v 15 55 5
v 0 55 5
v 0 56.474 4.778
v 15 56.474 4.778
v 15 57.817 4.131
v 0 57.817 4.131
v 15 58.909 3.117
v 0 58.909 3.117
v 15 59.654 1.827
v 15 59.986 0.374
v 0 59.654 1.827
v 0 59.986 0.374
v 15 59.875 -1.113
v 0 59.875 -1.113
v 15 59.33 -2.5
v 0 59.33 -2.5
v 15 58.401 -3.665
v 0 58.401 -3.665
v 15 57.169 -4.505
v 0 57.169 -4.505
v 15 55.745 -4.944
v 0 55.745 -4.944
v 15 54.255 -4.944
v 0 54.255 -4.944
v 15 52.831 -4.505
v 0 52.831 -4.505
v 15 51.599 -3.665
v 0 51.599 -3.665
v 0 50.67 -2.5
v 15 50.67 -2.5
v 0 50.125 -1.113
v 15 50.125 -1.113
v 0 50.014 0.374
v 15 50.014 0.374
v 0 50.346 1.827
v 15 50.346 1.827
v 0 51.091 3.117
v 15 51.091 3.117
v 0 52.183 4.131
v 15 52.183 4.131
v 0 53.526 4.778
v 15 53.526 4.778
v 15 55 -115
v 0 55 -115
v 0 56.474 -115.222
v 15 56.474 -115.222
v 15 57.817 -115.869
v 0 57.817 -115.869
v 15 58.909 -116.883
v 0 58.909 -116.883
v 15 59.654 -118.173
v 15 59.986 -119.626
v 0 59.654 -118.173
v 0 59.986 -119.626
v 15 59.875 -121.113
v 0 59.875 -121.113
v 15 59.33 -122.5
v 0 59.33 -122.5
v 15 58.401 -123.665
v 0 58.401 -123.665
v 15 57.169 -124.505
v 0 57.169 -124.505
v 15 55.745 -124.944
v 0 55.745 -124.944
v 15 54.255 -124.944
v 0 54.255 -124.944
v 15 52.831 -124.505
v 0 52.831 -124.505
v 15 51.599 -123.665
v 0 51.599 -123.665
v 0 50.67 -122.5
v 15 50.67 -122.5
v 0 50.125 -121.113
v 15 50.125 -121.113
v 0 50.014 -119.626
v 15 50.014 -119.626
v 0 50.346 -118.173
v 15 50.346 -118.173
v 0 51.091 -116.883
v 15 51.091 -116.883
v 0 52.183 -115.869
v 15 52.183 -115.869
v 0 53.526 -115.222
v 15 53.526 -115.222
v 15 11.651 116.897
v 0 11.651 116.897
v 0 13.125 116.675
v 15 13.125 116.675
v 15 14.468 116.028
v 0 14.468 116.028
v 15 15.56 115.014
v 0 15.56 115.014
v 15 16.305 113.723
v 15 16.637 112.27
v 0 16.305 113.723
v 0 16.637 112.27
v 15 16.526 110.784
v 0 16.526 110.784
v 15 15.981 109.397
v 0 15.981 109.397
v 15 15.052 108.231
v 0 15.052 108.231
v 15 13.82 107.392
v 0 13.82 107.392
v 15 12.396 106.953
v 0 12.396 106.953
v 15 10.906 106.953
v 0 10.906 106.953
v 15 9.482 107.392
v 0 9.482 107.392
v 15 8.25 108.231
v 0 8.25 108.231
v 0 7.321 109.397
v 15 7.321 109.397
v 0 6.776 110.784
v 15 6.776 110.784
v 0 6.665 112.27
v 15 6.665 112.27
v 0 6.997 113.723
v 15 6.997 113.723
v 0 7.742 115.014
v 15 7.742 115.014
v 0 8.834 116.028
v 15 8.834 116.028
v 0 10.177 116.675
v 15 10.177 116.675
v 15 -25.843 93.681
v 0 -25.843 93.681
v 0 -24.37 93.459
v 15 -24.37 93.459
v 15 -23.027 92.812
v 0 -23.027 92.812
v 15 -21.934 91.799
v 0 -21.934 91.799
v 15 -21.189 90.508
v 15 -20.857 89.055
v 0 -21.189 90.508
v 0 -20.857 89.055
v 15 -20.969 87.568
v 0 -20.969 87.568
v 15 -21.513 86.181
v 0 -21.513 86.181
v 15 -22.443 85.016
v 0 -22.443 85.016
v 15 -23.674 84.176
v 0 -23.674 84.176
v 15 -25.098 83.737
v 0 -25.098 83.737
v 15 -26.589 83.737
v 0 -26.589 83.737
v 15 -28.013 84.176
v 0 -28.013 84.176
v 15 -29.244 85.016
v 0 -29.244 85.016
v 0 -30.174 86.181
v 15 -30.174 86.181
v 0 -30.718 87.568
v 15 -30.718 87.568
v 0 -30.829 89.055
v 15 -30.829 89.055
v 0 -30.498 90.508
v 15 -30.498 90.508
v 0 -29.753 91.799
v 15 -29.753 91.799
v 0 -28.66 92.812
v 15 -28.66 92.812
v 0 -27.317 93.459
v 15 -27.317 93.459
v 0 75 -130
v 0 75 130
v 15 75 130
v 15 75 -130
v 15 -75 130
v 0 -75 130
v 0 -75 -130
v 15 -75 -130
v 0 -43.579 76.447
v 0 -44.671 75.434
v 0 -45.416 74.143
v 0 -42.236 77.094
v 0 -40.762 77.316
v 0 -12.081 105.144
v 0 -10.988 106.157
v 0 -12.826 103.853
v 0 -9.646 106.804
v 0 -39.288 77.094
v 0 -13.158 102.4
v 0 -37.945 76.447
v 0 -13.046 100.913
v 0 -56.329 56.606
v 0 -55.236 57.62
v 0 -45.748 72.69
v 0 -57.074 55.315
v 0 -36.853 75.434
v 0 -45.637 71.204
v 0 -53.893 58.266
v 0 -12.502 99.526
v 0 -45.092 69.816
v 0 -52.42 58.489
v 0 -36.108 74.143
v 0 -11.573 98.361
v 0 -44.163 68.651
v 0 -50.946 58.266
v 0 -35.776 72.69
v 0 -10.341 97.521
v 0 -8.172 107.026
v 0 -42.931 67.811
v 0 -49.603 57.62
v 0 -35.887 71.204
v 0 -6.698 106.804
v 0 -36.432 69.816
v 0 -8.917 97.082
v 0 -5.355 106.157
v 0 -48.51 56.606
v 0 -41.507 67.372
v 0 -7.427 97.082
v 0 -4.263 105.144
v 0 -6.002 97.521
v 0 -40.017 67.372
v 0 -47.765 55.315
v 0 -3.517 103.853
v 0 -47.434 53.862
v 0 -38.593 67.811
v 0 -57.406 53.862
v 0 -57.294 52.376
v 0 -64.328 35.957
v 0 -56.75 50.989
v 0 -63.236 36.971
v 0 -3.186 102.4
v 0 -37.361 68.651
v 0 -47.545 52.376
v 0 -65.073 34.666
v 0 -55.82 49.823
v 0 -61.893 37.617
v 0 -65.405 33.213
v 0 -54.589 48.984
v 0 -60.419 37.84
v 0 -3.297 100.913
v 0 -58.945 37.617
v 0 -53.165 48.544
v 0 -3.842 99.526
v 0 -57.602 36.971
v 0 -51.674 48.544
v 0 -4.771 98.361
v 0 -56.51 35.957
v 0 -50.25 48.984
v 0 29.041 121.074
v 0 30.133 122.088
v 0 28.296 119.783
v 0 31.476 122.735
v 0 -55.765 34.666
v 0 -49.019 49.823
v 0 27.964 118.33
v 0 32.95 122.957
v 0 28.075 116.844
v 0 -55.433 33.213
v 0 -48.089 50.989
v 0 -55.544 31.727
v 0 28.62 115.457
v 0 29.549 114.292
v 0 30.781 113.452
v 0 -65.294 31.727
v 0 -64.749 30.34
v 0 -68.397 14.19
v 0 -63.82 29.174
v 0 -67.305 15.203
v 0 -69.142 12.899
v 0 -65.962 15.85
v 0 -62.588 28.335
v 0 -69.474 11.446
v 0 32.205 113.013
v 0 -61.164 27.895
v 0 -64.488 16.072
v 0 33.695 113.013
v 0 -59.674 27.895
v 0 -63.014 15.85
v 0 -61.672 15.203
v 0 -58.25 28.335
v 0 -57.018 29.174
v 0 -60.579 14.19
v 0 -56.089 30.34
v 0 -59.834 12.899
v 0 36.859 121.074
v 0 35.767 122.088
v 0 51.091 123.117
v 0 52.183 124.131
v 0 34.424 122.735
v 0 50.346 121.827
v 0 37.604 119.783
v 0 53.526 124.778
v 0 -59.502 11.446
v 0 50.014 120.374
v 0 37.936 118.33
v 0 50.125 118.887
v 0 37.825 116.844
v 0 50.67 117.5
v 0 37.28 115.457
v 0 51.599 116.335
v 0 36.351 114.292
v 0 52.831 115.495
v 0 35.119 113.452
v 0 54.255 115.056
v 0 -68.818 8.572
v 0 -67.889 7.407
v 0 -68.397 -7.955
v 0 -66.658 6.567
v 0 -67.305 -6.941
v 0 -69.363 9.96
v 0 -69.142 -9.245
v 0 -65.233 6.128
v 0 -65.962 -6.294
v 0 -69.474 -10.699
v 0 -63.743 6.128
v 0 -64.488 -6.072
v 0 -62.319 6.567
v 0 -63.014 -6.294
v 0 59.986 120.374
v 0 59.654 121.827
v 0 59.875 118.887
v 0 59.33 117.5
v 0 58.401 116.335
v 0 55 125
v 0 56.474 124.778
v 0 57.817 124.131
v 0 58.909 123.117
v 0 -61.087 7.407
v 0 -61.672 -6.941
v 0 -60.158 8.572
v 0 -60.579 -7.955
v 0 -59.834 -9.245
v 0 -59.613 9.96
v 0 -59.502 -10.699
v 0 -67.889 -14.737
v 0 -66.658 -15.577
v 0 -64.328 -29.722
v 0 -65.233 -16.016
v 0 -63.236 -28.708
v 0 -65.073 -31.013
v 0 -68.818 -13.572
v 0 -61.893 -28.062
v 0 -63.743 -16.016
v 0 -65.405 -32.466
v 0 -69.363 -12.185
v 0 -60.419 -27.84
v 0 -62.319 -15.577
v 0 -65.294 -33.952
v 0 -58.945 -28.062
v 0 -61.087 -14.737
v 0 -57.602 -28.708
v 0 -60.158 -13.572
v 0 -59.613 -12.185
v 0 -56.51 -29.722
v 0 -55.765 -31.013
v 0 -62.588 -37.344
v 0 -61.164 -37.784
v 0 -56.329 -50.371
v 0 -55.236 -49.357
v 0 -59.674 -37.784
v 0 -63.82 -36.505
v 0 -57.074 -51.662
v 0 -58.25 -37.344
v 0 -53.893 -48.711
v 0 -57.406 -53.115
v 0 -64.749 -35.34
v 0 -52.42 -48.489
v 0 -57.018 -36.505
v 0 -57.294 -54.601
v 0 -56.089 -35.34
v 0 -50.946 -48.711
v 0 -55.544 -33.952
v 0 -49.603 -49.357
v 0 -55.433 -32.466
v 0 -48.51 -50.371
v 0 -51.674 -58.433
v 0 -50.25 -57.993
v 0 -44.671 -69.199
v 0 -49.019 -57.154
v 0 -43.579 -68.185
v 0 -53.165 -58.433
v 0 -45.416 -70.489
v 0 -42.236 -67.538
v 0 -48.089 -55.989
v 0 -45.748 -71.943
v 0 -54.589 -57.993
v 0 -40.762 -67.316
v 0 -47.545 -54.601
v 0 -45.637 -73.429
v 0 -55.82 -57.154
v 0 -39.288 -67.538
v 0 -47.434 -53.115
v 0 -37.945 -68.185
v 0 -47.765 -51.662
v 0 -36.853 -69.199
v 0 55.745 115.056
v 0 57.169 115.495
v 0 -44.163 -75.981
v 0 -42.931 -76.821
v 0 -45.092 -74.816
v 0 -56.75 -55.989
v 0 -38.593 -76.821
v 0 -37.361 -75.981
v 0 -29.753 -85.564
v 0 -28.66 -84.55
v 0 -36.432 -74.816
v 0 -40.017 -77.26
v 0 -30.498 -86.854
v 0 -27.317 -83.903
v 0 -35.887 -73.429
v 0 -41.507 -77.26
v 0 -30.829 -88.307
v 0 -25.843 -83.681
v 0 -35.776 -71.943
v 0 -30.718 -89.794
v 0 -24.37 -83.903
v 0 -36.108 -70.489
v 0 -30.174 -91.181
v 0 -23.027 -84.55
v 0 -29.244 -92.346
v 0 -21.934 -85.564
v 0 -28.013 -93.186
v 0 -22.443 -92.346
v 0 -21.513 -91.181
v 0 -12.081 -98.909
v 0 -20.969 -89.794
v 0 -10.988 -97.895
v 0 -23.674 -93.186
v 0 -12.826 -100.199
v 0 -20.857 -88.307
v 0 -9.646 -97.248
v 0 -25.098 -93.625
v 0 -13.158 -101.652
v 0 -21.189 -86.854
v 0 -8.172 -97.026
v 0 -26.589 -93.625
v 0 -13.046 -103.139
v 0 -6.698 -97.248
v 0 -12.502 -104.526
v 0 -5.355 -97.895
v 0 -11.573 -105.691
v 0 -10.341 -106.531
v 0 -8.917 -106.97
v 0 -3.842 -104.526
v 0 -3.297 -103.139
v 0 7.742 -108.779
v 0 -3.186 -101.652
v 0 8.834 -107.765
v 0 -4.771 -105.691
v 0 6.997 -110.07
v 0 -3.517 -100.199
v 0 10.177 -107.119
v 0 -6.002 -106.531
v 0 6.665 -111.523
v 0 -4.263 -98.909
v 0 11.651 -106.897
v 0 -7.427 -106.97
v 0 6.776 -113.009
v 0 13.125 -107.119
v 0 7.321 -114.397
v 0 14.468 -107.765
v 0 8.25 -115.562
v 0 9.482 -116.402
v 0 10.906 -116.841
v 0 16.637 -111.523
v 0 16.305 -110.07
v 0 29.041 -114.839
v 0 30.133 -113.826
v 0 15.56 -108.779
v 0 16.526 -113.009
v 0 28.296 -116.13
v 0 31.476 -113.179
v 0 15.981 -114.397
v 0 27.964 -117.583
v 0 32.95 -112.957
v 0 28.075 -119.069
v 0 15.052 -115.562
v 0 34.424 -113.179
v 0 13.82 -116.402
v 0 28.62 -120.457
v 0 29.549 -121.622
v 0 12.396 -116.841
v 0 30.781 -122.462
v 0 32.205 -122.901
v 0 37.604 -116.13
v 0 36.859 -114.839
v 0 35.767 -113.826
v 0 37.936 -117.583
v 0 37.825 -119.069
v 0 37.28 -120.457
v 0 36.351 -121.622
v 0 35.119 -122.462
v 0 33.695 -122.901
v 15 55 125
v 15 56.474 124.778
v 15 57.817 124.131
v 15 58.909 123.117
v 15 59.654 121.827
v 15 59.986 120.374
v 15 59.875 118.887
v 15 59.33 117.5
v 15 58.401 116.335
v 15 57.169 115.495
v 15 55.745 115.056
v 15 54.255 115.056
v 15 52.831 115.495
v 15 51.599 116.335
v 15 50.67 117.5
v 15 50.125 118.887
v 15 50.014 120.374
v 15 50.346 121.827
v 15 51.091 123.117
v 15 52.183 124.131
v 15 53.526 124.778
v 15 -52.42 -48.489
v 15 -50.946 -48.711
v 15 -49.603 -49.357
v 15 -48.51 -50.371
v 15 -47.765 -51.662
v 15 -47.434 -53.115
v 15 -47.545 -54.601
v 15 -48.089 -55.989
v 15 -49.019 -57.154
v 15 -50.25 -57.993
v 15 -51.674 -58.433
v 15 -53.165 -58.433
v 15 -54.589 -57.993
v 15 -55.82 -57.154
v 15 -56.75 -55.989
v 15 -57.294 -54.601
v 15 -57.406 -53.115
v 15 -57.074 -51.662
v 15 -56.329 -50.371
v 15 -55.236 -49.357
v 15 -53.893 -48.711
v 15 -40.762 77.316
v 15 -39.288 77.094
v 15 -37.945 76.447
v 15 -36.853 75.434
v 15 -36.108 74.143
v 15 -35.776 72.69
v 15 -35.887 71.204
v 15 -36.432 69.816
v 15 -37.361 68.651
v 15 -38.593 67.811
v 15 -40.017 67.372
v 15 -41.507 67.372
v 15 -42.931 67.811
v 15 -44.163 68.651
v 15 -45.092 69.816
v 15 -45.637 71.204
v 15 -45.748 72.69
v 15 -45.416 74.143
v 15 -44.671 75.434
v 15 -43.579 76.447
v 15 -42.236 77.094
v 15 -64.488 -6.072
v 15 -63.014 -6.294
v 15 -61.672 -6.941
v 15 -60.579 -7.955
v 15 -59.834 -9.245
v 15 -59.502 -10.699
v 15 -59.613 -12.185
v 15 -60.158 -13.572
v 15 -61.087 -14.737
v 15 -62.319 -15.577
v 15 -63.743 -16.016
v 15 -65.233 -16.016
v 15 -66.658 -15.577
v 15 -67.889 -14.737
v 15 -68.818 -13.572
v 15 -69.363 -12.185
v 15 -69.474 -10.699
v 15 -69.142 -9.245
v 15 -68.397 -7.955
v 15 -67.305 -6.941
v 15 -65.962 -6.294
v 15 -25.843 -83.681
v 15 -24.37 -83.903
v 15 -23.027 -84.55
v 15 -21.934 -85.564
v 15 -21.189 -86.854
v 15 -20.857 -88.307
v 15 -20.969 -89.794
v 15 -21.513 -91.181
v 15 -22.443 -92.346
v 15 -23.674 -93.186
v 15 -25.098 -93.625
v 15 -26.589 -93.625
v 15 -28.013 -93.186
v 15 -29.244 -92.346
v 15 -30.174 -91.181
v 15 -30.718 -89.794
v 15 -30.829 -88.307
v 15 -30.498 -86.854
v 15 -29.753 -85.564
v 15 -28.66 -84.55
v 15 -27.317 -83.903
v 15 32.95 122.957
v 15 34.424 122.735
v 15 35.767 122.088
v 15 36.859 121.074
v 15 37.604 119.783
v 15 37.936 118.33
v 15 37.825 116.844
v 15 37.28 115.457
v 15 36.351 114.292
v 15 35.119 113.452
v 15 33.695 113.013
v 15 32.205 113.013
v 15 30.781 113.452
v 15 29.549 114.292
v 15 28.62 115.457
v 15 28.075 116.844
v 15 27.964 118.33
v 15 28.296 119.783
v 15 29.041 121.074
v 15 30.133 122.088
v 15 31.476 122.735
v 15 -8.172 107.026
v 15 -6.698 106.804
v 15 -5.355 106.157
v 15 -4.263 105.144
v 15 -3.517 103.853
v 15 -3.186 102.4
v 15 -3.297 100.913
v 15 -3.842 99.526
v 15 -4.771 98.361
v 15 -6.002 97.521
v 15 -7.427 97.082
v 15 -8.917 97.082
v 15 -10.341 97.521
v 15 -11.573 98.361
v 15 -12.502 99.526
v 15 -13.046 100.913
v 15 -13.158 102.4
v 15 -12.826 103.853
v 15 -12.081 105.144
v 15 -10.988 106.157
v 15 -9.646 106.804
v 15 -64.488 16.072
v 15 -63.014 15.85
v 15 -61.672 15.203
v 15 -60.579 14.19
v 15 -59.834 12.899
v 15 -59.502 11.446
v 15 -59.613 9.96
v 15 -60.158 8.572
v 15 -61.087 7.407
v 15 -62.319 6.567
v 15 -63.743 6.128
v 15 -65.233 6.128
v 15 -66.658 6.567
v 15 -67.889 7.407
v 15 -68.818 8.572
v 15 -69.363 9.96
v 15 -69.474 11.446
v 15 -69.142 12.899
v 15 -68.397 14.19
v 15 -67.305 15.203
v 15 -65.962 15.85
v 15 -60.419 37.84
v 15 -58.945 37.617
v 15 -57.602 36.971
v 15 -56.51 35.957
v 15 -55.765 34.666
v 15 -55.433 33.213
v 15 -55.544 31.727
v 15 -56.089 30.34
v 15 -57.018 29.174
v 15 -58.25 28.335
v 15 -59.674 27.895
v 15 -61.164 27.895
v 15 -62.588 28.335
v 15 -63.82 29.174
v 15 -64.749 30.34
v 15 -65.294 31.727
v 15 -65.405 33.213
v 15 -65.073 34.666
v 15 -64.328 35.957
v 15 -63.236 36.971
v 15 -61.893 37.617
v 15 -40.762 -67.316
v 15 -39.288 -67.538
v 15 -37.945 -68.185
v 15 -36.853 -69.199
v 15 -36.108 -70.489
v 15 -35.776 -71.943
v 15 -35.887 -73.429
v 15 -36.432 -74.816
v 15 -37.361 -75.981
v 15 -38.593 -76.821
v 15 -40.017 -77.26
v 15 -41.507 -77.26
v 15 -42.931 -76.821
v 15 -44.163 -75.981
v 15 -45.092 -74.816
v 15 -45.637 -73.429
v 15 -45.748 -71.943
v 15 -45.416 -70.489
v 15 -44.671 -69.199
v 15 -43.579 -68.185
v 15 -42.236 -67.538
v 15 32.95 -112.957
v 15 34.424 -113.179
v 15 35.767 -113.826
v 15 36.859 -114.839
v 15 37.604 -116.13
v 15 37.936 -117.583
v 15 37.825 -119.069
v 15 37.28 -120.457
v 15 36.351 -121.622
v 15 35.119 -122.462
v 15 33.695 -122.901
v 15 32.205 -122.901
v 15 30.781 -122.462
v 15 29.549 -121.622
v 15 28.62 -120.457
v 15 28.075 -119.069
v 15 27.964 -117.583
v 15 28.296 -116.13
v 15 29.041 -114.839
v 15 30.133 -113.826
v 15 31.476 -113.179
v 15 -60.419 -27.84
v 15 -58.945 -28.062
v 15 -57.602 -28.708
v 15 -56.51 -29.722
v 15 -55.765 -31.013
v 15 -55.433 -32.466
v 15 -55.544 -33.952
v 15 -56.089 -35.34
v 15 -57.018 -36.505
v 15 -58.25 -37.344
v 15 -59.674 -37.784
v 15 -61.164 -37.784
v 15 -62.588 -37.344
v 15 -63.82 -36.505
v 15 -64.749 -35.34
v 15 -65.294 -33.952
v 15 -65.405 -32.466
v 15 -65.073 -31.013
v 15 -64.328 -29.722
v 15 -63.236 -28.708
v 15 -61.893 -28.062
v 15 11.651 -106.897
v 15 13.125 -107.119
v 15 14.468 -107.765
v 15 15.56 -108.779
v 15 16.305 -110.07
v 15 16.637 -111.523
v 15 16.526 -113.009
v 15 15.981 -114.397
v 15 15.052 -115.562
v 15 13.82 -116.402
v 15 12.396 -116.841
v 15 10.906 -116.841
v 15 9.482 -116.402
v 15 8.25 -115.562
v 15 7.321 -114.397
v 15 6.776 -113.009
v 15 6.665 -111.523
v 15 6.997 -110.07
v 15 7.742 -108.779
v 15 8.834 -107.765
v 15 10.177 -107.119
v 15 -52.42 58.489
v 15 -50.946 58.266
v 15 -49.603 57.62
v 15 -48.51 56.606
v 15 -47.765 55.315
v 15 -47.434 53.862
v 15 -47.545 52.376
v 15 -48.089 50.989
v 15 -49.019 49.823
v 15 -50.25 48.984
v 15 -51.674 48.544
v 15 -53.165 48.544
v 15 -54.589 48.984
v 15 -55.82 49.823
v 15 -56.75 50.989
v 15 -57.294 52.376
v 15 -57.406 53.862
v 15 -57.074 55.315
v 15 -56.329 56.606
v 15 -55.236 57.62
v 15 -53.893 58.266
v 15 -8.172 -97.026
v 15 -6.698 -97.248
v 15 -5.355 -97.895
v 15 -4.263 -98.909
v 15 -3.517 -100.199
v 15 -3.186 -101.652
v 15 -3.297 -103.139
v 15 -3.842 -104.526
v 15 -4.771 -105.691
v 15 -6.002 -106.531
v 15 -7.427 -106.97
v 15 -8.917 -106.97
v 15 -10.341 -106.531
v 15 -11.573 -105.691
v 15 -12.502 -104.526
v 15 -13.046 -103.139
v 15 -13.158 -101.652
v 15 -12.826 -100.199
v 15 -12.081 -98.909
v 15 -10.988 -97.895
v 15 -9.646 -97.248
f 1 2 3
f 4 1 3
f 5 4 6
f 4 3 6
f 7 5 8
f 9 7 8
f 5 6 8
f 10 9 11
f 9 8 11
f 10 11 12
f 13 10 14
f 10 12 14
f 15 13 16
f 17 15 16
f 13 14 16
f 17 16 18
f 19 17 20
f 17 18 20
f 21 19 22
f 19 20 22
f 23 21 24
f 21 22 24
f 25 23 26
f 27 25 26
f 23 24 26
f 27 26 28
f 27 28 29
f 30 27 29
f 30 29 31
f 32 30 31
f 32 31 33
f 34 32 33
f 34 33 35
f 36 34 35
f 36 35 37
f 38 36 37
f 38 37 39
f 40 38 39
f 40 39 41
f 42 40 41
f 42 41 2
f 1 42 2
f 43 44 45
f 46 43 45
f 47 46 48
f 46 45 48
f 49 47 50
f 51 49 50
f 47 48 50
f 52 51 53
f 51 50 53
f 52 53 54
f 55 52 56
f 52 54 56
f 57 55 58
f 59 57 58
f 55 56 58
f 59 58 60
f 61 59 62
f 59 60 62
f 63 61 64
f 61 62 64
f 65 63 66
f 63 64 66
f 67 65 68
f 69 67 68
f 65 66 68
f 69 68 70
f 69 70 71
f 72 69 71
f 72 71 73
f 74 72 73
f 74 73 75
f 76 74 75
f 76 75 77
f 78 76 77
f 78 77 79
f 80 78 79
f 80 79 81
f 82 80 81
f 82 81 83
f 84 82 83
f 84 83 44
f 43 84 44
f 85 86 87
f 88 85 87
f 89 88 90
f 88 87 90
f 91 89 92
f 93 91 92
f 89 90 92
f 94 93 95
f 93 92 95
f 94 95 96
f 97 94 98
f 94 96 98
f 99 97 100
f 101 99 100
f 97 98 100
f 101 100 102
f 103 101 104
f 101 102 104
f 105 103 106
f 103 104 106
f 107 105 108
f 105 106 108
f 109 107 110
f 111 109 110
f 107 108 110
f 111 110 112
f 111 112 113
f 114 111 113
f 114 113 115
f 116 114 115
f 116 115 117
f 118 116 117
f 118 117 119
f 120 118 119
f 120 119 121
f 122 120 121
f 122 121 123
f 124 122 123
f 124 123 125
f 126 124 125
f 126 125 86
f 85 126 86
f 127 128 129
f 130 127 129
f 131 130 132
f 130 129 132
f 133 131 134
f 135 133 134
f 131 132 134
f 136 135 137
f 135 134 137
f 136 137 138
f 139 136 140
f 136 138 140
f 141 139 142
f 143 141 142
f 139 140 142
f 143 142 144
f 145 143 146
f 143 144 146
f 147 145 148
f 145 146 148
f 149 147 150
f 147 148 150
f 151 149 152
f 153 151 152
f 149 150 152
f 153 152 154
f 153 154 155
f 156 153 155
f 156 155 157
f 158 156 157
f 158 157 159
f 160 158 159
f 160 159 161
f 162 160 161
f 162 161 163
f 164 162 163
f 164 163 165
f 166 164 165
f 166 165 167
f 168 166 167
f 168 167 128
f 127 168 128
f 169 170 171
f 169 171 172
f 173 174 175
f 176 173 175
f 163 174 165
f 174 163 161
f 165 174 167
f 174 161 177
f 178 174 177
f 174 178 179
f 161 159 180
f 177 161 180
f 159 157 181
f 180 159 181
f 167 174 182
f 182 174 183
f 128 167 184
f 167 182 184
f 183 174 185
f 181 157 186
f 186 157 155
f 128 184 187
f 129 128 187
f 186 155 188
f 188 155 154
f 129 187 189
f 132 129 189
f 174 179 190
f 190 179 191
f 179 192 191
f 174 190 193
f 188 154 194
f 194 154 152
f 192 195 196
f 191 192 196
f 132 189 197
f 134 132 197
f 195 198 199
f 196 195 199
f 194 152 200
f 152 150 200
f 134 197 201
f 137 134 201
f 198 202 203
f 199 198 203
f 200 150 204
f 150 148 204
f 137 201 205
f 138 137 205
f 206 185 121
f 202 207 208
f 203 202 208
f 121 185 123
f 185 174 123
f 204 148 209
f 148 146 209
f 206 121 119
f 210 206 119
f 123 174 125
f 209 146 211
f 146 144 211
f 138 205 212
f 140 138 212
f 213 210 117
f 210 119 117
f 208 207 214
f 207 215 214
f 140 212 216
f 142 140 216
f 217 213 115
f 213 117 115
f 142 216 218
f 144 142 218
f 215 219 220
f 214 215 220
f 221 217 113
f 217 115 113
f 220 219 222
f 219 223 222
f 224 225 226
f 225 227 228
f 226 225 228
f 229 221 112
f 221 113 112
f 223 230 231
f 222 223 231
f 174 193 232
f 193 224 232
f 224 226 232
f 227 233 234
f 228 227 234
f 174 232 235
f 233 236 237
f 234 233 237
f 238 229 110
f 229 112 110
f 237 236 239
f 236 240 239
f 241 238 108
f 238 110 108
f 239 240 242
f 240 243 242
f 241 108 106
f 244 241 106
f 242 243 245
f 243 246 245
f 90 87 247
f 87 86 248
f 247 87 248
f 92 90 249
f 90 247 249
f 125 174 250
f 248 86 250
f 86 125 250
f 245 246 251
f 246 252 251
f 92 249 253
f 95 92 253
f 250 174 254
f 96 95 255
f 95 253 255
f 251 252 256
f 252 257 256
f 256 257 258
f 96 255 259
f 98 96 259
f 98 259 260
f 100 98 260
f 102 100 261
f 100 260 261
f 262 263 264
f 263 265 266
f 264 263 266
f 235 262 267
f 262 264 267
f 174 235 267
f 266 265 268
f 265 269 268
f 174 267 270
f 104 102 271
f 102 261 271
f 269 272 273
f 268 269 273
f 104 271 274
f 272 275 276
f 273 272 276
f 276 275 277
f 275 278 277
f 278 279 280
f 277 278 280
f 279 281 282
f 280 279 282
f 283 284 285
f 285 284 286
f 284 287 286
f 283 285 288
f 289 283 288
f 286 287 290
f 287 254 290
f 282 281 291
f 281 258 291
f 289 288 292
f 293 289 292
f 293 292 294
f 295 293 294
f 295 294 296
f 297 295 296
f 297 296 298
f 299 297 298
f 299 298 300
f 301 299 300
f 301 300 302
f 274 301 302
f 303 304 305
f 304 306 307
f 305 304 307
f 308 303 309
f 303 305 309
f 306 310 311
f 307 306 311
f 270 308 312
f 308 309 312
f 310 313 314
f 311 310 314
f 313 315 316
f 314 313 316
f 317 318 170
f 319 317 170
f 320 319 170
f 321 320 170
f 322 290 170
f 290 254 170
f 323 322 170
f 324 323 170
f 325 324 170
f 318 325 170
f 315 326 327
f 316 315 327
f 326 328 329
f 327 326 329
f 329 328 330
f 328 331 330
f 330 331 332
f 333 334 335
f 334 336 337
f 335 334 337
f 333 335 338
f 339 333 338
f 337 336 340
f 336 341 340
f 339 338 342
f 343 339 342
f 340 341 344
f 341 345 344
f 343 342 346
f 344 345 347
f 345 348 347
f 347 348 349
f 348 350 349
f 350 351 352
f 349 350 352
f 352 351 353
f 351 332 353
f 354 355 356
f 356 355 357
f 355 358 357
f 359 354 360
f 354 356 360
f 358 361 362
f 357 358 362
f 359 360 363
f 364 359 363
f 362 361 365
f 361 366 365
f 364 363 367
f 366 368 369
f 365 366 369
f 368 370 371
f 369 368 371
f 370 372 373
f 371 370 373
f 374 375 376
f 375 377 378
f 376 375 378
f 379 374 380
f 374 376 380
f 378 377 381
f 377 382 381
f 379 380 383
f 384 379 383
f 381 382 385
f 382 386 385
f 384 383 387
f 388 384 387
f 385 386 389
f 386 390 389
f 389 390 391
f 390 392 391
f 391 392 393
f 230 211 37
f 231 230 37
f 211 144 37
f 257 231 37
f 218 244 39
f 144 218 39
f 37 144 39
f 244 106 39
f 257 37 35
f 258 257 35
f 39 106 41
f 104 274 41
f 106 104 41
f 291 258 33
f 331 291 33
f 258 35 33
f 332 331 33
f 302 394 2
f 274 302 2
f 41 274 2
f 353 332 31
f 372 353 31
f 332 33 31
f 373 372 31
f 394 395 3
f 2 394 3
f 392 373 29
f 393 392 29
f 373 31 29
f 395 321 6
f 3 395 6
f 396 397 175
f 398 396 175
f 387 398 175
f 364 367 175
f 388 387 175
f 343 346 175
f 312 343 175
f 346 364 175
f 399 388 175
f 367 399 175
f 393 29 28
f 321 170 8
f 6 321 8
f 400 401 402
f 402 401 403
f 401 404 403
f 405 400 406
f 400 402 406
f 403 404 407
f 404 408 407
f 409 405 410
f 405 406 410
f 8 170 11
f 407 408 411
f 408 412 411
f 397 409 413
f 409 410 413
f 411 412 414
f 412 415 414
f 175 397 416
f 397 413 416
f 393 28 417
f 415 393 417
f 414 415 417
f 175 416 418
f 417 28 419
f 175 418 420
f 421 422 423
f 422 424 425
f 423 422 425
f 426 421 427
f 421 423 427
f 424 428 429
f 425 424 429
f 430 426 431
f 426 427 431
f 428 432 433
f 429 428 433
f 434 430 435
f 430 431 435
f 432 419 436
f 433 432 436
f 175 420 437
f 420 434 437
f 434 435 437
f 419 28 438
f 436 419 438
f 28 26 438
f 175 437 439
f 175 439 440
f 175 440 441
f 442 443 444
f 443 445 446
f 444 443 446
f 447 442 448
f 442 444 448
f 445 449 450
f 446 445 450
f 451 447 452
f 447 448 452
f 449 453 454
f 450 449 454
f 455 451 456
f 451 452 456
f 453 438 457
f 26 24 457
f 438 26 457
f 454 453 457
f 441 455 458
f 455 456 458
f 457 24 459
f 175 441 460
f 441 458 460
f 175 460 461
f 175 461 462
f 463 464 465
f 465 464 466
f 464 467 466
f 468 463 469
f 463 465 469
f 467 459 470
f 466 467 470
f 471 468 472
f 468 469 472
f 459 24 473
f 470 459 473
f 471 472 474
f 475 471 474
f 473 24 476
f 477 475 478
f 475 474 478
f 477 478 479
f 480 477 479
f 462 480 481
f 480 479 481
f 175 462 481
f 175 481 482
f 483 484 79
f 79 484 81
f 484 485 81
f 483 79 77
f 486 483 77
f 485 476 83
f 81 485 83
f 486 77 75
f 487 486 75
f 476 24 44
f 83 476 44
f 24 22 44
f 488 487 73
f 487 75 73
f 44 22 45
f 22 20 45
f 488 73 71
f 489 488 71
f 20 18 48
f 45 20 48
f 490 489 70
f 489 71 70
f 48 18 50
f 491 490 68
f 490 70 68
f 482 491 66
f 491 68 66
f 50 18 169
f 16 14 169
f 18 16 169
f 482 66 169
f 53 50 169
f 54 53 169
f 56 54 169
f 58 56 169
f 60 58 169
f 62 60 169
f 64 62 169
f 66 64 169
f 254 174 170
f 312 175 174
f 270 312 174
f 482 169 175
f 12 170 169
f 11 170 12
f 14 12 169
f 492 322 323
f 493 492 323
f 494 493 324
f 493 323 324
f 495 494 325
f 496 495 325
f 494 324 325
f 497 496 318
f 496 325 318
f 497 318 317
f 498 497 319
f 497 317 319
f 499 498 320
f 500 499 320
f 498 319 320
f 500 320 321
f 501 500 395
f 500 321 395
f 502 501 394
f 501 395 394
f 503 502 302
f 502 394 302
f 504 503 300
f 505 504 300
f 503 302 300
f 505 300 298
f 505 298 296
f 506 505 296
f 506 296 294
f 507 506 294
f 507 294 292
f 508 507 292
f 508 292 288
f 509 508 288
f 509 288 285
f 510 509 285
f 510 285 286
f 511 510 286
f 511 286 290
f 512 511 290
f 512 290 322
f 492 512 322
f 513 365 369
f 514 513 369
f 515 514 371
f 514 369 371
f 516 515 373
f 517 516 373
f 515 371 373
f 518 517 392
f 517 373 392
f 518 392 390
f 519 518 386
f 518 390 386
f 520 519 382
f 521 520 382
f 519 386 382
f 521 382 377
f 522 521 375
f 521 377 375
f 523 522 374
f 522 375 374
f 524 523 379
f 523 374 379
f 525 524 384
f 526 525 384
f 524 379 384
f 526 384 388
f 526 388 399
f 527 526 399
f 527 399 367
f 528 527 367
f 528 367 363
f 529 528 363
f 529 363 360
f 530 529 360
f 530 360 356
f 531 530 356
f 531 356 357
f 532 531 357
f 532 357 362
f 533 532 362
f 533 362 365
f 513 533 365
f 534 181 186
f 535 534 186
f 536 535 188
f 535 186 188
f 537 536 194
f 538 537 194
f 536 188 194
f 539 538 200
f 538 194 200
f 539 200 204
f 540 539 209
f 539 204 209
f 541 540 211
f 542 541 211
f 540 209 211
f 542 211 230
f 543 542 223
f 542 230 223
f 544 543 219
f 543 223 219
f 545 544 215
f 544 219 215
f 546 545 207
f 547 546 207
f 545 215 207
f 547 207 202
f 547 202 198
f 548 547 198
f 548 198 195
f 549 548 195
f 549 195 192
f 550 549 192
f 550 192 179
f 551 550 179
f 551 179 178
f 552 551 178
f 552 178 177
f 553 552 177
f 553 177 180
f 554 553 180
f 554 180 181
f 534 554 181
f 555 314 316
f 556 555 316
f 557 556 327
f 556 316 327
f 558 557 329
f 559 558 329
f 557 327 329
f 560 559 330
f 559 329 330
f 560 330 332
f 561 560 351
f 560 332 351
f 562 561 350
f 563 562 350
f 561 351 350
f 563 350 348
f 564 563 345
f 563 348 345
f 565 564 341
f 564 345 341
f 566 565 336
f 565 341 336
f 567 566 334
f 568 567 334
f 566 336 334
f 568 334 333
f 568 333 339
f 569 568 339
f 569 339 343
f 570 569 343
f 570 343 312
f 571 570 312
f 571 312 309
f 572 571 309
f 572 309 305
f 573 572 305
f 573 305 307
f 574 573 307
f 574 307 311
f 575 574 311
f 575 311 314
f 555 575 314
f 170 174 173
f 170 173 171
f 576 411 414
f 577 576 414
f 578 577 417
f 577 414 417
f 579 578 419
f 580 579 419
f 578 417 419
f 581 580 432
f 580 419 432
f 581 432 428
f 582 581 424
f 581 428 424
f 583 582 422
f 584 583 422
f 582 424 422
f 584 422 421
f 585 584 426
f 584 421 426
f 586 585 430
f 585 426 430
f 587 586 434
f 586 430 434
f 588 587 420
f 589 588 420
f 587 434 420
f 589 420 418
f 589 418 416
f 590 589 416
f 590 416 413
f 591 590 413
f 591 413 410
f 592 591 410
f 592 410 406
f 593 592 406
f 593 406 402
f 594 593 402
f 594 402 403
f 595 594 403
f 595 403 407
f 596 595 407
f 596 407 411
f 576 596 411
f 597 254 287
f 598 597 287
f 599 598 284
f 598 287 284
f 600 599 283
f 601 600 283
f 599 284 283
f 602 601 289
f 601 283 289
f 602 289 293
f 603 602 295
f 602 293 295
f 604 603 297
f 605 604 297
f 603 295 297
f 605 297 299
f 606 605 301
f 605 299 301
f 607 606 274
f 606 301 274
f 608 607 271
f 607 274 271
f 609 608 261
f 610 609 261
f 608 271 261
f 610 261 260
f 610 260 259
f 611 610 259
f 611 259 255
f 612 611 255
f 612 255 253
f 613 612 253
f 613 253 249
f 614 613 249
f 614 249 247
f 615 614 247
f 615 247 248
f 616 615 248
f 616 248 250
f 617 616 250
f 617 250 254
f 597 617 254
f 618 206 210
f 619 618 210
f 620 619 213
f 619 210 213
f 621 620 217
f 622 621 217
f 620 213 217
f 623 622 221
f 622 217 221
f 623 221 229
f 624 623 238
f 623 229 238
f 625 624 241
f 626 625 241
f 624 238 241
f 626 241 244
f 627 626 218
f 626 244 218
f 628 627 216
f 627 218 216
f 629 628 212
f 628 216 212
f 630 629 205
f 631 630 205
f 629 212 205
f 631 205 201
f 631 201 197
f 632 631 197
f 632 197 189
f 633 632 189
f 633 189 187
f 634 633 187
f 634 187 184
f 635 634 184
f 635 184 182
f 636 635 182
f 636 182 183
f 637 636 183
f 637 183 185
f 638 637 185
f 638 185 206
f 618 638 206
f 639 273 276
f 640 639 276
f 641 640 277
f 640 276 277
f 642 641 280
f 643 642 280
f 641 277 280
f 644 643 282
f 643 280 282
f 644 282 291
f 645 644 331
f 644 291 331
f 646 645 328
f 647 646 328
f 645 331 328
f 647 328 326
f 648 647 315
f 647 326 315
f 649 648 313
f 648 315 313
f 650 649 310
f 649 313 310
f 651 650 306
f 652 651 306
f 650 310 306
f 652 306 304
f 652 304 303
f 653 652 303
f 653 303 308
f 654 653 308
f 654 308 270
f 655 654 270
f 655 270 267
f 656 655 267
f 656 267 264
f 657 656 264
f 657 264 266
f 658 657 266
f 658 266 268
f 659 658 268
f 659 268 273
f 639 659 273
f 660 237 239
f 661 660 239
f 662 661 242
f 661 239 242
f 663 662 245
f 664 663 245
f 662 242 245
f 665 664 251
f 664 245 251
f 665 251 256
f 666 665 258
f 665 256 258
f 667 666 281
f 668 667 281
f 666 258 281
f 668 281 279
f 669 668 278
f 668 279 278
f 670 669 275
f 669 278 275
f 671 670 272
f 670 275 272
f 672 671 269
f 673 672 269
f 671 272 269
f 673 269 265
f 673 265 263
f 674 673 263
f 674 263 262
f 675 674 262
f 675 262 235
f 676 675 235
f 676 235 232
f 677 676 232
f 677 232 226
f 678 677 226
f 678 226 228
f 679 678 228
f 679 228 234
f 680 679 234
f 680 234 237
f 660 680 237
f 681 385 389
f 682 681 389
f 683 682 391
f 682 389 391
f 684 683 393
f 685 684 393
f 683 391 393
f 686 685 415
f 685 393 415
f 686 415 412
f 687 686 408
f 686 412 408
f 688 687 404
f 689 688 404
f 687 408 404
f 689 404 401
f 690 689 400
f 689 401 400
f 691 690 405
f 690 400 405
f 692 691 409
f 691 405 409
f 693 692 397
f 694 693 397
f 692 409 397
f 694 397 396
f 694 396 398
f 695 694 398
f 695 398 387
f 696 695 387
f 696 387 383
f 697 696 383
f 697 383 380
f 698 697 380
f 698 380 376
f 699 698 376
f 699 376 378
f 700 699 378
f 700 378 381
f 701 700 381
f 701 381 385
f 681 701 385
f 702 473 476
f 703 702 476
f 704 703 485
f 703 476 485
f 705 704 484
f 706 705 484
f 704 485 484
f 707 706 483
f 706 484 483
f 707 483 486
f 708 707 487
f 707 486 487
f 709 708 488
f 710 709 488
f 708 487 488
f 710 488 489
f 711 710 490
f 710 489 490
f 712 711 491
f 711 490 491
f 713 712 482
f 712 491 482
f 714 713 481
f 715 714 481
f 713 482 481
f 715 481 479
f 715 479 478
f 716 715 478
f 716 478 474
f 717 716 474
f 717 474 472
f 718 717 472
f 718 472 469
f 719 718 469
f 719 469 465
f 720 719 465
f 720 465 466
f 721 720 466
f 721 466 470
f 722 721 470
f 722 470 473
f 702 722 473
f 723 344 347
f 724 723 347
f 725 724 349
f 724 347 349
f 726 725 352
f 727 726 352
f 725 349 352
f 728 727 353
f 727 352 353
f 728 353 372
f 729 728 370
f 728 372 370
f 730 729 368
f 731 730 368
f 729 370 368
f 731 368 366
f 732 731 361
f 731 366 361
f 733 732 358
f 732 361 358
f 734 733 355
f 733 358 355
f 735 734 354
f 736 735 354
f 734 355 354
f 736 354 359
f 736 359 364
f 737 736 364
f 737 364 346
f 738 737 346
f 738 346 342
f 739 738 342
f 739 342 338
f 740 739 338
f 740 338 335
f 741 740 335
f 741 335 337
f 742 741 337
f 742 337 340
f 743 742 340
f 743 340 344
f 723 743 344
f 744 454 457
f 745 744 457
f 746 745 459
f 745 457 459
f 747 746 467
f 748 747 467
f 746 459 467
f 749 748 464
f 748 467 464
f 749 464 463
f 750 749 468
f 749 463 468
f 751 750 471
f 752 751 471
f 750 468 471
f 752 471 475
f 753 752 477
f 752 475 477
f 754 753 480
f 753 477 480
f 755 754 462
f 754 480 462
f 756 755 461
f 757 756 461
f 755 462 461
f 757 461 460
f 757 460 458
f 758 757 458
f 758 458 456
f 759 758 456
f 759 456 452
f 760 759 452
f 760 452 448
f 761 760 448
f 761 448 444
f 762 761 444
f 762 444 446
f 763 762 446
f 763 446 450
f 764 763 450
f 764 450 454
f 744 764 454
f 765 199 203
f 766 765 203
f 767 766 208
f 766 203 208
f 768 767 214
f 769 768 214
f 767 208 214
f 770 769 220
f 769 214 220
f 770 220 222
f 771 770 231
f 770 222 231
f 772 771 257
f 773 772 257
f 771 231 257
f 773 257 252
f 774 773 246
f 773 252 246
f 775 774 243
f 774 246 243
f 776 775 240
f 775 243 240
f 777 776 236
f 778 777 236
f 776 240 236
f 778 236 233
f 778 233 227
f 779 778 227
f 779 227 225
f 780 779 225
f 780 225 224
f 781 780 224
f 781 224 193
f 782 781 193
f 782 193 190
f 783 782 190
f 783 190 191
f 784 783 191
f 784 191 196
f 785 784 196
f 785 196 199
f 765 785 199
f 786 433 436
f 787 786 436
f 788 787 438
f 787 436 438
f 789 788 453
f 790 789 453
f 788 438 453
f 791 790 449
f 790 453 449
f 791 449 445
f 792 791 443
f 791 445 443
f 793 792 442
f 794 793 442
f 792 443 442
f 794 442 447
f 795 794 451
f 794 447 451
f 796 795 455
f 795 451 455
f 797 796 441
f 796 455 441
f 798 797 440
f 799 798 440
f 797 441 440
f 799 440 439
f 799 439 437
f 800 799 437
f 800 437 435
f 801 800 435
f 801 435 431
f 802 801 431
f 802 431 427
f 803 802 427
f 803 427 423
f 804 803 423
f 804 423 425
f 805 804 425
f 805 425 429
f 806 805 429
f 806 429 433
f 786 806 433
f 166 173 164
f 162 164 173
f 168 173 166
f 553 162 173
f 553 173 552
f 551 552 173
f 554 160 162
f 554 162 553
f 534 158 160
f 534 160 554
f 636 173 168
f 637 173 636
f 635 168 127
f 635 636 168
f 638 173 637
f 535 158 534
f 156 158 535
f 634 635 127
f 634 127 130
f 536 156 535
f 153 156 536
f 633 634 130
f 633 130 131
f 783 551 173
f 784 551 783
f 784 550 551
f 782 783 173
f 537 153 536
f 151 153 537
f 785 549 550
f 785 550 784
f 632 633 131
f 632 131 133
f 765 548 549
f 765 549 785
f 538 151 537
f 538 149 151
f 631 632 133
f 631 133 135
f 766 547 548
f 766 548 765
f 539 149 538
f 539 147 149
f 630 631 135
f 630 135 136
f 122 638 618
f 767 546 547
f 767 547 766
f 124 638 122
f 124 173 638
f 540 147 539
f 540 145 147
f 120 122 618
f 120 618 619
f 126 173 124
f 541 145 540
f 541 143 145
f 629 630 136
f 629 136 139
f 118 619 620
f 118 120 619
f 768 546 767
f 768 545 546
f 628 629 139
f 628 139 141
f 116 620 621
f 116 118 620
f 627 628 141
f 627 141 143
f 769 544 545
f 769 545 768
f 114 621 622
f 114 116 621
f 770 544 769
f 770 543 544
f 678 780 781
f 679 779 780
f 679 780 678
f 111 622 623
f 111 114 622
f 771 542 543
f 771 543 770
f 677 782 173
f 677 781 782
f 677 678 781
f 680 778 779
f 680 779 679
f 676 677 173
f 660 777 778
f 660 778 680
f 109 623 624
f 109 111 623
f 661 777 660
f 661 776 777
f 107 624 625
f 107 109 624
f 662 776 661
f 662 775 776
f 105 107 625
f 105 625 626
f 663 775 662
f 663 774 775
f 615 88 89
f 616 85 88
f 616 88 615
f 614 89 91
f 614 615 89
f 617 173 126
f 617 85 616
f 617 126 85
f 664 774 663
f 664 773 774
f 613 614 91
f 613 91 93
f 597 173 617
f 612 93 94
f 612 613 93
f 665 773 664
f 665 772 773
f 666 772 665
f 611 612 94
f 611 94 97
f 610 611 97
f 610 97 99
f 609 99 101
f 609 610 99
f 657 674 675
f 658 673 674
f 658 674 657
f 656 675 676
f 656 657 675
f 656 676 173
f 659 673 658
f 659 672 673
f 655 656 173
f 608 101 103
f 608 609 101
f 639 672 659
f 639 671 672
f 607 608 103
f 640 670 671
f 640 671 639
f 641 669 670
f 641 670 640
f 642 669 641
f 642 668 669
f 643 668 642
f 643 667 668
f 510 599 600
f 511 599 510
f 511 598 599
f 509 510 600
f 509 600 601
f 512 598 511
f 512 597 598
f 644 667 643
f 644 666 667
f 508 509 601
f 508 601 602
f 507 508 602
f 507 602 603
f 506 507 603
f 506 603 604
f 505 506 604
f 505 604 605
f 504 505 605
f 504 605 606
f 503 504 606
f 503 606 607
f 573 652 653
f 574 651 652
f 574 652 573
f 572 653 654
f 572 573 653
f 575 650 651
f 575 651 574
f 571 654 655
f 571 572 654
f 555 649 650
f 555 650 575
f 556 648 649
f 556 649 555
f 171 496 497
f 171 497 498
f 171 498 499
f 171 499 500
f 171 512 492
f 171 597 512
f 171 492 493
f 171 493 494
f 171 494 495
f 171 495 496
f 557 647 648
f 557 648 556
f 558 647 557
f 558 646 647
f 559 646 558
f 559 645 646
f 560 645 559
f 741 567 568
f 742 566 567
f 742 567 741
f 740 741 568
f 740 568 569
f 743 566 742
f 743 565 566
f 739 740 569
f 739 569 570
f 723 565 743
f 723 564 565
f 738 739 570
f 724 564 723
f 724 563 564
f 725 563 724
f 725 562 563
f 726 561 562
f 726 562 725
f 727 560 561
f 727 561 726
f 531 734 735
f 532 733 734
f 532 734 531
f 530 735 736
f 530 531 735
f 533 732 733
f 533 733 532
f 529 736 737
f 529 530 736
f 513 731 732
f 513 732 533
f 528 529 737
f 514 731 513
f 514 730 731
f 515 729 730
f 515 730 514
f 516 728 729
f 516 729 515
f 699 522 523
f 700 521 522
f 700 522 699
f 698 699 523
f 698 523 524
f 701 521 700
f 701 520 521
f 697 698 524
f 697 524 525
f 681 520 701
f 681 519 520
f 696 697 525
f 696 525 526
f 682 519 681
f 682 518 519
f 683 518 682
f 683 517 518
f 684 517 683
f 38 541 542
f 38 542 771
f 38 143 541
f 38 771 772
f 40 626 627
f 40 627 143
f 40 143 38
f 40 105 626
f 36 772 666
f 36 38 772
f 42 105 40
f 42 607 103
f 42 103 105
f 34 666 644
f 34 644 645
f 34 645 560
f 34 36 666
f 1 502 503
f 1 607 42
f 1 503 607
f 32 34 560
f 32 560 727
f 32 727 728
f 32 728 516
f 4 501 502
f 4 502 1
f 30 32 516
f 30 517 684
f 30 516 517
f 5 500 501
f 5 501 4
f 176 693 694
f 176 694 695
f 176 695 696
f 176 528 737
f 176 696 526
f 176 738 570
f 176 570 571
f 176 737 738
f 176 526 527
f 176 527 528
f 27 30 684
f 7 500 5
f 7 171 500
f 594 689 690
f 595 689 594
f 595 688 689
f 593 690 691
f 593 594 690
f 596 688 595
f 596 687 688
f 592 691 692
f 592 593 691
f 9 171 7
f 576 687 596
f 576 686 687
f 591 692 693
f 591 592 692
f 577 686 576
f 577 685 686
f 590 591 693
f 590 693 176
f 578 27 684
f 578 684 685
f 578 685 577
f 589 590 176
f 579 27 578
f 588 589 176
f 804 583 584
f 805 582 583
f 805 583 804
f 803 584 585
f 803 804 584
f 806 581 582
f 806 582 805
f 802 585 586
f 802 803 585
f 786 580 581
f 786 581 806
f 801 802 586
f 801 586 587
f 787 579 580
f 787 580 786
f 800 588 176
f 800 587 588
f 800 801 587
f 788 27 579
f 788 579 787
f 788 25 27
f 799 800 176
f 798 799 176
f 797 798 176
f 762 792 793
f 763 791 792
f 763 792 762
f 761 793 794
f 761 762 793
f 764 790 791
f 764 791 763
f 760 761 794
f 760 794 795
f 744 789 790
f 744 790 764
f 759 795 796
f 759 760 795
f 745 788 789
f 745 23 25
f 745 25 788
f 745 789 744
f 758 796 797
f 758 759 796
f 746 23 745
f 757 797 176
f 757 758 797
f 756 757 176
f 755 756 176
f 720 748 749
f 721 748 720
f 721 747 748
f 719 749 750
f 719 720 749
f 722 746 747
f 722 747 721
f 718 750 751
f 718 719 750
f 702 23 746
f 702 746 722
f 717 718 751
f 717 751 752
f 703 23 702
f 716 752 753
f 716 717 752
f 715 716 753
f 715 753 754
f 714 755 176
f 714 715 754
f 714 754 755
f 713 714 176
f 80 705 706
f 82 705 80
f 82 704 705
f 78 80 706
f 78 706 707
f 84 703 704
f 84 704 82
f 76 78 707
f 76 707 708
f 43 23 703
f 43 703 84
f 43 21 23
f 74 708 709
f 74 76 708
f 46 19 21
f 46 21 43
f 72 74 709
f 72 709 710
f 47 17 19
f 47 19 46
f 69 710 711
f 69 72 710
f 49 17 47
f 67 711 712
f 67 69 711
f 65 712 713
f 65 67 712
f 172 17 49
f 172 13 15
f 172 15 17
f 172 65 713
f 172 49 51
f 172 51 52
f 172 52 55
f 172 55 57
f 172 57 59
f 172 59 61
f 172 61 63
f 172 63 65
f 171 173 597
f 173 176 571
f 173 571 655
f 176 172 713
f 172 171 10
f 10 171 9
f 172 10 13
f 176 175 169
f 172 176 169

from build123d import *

# Parameters (mm, degrees)
SKETCH1_W           = 260
SKETCH1_H           = 150
BOSS_EXTRUDE1_DEPTH = 15
SKETCH3_R           = 5
CUT_EXTRUDE1_DEPTH  = 16
SKETCH4_R           = 5
CUT_EXTRUDE2_DEPTH  = 16


with BuildPart() as part:
    # Sketch1 → Boss-Extrude1 (new body)
    with BuildSketch(Plane(origin=(0, 0, 0), x_dir=(0, 0, -1), z_dir=(1, 0, 0))):
        Rectangle(SKETCH1_W, SKETCH1_H)
    extrude(amount=BOSS_EXTRUDE1_DEPTH)

    # Sketch3 → Cut-Extrude1 (cut, through all)
    with BuildSketch(Plane.ZY):
        with Locations((0, 55)):
            Circle(SKETCH3_R)
    extrude(amount=-CUT_EXTRUDE1_DEPTH, mode=Mode.SUBTRACT)

    # Sketch4 → Cut-Extrude2 (cut, through all)
    with BuildSketch(Plane.ZY):
        with Locations((-120, 55)):
            Circle(SKETCH4_R)
        with Locations((-117.956771962, 32.950057862)):
            Circle(SKETCH4_R)
        with Locations((-111.896667529, 11.651000058)):
            Circle(SKETCH4_R)
        with Locations((-102.026056288, -8.171859545)):
            Circle(SKETCH4_R)
        with Locations((-88.681070066, -25.843477238)):
            Circle(SKETCH4_R)
        with Locations((-72.316156366, -40.762067274)):
            Circle(SKETCH4_R)
        with Locations((-53.488602693, -52.419594963)):
            Circle(SKETCH4_R)
        with Locations((-32.839558809, -60.419077181)):
            Circle(SKETCH4_R)
        with Locations((-11.072203136, -64.488101155)):
            Circle(SKETCH4_R)
        with Locations((11.072203136, -64.488101155)):
            Circle(SKETCH4_R)
        with Locations((32.839558809, -60.419077181)):
            Circle(SKETCH4_R)
        with Locations((53.488602693, -52.419594963)):
            Circle(SKETCH4_R)
        with Locations((72.316156366, -40.762067274)):
            Circle(SKETCH4_R)
        with Locations((88.681070066, -25.843477238)):
            Circle(SKETCH4_R)
        with Locations((102.026056288, -8.171859545)):
            Circle(SKETCH4_R)
        with Locations((111.896667529, 11.651000058)):
            Circle(SKETCH4_R)
        with Locations((117.956771962, 32.950057862)):
            Circle(SKETCH4_R)
        with Locations((120, 55)):
            Circle(SKETCH4_R)
    extrude(amount=-CUT_EXTRUDE2_DEPTH, mode=Mode.SUBTRACT)


solid = part.part
